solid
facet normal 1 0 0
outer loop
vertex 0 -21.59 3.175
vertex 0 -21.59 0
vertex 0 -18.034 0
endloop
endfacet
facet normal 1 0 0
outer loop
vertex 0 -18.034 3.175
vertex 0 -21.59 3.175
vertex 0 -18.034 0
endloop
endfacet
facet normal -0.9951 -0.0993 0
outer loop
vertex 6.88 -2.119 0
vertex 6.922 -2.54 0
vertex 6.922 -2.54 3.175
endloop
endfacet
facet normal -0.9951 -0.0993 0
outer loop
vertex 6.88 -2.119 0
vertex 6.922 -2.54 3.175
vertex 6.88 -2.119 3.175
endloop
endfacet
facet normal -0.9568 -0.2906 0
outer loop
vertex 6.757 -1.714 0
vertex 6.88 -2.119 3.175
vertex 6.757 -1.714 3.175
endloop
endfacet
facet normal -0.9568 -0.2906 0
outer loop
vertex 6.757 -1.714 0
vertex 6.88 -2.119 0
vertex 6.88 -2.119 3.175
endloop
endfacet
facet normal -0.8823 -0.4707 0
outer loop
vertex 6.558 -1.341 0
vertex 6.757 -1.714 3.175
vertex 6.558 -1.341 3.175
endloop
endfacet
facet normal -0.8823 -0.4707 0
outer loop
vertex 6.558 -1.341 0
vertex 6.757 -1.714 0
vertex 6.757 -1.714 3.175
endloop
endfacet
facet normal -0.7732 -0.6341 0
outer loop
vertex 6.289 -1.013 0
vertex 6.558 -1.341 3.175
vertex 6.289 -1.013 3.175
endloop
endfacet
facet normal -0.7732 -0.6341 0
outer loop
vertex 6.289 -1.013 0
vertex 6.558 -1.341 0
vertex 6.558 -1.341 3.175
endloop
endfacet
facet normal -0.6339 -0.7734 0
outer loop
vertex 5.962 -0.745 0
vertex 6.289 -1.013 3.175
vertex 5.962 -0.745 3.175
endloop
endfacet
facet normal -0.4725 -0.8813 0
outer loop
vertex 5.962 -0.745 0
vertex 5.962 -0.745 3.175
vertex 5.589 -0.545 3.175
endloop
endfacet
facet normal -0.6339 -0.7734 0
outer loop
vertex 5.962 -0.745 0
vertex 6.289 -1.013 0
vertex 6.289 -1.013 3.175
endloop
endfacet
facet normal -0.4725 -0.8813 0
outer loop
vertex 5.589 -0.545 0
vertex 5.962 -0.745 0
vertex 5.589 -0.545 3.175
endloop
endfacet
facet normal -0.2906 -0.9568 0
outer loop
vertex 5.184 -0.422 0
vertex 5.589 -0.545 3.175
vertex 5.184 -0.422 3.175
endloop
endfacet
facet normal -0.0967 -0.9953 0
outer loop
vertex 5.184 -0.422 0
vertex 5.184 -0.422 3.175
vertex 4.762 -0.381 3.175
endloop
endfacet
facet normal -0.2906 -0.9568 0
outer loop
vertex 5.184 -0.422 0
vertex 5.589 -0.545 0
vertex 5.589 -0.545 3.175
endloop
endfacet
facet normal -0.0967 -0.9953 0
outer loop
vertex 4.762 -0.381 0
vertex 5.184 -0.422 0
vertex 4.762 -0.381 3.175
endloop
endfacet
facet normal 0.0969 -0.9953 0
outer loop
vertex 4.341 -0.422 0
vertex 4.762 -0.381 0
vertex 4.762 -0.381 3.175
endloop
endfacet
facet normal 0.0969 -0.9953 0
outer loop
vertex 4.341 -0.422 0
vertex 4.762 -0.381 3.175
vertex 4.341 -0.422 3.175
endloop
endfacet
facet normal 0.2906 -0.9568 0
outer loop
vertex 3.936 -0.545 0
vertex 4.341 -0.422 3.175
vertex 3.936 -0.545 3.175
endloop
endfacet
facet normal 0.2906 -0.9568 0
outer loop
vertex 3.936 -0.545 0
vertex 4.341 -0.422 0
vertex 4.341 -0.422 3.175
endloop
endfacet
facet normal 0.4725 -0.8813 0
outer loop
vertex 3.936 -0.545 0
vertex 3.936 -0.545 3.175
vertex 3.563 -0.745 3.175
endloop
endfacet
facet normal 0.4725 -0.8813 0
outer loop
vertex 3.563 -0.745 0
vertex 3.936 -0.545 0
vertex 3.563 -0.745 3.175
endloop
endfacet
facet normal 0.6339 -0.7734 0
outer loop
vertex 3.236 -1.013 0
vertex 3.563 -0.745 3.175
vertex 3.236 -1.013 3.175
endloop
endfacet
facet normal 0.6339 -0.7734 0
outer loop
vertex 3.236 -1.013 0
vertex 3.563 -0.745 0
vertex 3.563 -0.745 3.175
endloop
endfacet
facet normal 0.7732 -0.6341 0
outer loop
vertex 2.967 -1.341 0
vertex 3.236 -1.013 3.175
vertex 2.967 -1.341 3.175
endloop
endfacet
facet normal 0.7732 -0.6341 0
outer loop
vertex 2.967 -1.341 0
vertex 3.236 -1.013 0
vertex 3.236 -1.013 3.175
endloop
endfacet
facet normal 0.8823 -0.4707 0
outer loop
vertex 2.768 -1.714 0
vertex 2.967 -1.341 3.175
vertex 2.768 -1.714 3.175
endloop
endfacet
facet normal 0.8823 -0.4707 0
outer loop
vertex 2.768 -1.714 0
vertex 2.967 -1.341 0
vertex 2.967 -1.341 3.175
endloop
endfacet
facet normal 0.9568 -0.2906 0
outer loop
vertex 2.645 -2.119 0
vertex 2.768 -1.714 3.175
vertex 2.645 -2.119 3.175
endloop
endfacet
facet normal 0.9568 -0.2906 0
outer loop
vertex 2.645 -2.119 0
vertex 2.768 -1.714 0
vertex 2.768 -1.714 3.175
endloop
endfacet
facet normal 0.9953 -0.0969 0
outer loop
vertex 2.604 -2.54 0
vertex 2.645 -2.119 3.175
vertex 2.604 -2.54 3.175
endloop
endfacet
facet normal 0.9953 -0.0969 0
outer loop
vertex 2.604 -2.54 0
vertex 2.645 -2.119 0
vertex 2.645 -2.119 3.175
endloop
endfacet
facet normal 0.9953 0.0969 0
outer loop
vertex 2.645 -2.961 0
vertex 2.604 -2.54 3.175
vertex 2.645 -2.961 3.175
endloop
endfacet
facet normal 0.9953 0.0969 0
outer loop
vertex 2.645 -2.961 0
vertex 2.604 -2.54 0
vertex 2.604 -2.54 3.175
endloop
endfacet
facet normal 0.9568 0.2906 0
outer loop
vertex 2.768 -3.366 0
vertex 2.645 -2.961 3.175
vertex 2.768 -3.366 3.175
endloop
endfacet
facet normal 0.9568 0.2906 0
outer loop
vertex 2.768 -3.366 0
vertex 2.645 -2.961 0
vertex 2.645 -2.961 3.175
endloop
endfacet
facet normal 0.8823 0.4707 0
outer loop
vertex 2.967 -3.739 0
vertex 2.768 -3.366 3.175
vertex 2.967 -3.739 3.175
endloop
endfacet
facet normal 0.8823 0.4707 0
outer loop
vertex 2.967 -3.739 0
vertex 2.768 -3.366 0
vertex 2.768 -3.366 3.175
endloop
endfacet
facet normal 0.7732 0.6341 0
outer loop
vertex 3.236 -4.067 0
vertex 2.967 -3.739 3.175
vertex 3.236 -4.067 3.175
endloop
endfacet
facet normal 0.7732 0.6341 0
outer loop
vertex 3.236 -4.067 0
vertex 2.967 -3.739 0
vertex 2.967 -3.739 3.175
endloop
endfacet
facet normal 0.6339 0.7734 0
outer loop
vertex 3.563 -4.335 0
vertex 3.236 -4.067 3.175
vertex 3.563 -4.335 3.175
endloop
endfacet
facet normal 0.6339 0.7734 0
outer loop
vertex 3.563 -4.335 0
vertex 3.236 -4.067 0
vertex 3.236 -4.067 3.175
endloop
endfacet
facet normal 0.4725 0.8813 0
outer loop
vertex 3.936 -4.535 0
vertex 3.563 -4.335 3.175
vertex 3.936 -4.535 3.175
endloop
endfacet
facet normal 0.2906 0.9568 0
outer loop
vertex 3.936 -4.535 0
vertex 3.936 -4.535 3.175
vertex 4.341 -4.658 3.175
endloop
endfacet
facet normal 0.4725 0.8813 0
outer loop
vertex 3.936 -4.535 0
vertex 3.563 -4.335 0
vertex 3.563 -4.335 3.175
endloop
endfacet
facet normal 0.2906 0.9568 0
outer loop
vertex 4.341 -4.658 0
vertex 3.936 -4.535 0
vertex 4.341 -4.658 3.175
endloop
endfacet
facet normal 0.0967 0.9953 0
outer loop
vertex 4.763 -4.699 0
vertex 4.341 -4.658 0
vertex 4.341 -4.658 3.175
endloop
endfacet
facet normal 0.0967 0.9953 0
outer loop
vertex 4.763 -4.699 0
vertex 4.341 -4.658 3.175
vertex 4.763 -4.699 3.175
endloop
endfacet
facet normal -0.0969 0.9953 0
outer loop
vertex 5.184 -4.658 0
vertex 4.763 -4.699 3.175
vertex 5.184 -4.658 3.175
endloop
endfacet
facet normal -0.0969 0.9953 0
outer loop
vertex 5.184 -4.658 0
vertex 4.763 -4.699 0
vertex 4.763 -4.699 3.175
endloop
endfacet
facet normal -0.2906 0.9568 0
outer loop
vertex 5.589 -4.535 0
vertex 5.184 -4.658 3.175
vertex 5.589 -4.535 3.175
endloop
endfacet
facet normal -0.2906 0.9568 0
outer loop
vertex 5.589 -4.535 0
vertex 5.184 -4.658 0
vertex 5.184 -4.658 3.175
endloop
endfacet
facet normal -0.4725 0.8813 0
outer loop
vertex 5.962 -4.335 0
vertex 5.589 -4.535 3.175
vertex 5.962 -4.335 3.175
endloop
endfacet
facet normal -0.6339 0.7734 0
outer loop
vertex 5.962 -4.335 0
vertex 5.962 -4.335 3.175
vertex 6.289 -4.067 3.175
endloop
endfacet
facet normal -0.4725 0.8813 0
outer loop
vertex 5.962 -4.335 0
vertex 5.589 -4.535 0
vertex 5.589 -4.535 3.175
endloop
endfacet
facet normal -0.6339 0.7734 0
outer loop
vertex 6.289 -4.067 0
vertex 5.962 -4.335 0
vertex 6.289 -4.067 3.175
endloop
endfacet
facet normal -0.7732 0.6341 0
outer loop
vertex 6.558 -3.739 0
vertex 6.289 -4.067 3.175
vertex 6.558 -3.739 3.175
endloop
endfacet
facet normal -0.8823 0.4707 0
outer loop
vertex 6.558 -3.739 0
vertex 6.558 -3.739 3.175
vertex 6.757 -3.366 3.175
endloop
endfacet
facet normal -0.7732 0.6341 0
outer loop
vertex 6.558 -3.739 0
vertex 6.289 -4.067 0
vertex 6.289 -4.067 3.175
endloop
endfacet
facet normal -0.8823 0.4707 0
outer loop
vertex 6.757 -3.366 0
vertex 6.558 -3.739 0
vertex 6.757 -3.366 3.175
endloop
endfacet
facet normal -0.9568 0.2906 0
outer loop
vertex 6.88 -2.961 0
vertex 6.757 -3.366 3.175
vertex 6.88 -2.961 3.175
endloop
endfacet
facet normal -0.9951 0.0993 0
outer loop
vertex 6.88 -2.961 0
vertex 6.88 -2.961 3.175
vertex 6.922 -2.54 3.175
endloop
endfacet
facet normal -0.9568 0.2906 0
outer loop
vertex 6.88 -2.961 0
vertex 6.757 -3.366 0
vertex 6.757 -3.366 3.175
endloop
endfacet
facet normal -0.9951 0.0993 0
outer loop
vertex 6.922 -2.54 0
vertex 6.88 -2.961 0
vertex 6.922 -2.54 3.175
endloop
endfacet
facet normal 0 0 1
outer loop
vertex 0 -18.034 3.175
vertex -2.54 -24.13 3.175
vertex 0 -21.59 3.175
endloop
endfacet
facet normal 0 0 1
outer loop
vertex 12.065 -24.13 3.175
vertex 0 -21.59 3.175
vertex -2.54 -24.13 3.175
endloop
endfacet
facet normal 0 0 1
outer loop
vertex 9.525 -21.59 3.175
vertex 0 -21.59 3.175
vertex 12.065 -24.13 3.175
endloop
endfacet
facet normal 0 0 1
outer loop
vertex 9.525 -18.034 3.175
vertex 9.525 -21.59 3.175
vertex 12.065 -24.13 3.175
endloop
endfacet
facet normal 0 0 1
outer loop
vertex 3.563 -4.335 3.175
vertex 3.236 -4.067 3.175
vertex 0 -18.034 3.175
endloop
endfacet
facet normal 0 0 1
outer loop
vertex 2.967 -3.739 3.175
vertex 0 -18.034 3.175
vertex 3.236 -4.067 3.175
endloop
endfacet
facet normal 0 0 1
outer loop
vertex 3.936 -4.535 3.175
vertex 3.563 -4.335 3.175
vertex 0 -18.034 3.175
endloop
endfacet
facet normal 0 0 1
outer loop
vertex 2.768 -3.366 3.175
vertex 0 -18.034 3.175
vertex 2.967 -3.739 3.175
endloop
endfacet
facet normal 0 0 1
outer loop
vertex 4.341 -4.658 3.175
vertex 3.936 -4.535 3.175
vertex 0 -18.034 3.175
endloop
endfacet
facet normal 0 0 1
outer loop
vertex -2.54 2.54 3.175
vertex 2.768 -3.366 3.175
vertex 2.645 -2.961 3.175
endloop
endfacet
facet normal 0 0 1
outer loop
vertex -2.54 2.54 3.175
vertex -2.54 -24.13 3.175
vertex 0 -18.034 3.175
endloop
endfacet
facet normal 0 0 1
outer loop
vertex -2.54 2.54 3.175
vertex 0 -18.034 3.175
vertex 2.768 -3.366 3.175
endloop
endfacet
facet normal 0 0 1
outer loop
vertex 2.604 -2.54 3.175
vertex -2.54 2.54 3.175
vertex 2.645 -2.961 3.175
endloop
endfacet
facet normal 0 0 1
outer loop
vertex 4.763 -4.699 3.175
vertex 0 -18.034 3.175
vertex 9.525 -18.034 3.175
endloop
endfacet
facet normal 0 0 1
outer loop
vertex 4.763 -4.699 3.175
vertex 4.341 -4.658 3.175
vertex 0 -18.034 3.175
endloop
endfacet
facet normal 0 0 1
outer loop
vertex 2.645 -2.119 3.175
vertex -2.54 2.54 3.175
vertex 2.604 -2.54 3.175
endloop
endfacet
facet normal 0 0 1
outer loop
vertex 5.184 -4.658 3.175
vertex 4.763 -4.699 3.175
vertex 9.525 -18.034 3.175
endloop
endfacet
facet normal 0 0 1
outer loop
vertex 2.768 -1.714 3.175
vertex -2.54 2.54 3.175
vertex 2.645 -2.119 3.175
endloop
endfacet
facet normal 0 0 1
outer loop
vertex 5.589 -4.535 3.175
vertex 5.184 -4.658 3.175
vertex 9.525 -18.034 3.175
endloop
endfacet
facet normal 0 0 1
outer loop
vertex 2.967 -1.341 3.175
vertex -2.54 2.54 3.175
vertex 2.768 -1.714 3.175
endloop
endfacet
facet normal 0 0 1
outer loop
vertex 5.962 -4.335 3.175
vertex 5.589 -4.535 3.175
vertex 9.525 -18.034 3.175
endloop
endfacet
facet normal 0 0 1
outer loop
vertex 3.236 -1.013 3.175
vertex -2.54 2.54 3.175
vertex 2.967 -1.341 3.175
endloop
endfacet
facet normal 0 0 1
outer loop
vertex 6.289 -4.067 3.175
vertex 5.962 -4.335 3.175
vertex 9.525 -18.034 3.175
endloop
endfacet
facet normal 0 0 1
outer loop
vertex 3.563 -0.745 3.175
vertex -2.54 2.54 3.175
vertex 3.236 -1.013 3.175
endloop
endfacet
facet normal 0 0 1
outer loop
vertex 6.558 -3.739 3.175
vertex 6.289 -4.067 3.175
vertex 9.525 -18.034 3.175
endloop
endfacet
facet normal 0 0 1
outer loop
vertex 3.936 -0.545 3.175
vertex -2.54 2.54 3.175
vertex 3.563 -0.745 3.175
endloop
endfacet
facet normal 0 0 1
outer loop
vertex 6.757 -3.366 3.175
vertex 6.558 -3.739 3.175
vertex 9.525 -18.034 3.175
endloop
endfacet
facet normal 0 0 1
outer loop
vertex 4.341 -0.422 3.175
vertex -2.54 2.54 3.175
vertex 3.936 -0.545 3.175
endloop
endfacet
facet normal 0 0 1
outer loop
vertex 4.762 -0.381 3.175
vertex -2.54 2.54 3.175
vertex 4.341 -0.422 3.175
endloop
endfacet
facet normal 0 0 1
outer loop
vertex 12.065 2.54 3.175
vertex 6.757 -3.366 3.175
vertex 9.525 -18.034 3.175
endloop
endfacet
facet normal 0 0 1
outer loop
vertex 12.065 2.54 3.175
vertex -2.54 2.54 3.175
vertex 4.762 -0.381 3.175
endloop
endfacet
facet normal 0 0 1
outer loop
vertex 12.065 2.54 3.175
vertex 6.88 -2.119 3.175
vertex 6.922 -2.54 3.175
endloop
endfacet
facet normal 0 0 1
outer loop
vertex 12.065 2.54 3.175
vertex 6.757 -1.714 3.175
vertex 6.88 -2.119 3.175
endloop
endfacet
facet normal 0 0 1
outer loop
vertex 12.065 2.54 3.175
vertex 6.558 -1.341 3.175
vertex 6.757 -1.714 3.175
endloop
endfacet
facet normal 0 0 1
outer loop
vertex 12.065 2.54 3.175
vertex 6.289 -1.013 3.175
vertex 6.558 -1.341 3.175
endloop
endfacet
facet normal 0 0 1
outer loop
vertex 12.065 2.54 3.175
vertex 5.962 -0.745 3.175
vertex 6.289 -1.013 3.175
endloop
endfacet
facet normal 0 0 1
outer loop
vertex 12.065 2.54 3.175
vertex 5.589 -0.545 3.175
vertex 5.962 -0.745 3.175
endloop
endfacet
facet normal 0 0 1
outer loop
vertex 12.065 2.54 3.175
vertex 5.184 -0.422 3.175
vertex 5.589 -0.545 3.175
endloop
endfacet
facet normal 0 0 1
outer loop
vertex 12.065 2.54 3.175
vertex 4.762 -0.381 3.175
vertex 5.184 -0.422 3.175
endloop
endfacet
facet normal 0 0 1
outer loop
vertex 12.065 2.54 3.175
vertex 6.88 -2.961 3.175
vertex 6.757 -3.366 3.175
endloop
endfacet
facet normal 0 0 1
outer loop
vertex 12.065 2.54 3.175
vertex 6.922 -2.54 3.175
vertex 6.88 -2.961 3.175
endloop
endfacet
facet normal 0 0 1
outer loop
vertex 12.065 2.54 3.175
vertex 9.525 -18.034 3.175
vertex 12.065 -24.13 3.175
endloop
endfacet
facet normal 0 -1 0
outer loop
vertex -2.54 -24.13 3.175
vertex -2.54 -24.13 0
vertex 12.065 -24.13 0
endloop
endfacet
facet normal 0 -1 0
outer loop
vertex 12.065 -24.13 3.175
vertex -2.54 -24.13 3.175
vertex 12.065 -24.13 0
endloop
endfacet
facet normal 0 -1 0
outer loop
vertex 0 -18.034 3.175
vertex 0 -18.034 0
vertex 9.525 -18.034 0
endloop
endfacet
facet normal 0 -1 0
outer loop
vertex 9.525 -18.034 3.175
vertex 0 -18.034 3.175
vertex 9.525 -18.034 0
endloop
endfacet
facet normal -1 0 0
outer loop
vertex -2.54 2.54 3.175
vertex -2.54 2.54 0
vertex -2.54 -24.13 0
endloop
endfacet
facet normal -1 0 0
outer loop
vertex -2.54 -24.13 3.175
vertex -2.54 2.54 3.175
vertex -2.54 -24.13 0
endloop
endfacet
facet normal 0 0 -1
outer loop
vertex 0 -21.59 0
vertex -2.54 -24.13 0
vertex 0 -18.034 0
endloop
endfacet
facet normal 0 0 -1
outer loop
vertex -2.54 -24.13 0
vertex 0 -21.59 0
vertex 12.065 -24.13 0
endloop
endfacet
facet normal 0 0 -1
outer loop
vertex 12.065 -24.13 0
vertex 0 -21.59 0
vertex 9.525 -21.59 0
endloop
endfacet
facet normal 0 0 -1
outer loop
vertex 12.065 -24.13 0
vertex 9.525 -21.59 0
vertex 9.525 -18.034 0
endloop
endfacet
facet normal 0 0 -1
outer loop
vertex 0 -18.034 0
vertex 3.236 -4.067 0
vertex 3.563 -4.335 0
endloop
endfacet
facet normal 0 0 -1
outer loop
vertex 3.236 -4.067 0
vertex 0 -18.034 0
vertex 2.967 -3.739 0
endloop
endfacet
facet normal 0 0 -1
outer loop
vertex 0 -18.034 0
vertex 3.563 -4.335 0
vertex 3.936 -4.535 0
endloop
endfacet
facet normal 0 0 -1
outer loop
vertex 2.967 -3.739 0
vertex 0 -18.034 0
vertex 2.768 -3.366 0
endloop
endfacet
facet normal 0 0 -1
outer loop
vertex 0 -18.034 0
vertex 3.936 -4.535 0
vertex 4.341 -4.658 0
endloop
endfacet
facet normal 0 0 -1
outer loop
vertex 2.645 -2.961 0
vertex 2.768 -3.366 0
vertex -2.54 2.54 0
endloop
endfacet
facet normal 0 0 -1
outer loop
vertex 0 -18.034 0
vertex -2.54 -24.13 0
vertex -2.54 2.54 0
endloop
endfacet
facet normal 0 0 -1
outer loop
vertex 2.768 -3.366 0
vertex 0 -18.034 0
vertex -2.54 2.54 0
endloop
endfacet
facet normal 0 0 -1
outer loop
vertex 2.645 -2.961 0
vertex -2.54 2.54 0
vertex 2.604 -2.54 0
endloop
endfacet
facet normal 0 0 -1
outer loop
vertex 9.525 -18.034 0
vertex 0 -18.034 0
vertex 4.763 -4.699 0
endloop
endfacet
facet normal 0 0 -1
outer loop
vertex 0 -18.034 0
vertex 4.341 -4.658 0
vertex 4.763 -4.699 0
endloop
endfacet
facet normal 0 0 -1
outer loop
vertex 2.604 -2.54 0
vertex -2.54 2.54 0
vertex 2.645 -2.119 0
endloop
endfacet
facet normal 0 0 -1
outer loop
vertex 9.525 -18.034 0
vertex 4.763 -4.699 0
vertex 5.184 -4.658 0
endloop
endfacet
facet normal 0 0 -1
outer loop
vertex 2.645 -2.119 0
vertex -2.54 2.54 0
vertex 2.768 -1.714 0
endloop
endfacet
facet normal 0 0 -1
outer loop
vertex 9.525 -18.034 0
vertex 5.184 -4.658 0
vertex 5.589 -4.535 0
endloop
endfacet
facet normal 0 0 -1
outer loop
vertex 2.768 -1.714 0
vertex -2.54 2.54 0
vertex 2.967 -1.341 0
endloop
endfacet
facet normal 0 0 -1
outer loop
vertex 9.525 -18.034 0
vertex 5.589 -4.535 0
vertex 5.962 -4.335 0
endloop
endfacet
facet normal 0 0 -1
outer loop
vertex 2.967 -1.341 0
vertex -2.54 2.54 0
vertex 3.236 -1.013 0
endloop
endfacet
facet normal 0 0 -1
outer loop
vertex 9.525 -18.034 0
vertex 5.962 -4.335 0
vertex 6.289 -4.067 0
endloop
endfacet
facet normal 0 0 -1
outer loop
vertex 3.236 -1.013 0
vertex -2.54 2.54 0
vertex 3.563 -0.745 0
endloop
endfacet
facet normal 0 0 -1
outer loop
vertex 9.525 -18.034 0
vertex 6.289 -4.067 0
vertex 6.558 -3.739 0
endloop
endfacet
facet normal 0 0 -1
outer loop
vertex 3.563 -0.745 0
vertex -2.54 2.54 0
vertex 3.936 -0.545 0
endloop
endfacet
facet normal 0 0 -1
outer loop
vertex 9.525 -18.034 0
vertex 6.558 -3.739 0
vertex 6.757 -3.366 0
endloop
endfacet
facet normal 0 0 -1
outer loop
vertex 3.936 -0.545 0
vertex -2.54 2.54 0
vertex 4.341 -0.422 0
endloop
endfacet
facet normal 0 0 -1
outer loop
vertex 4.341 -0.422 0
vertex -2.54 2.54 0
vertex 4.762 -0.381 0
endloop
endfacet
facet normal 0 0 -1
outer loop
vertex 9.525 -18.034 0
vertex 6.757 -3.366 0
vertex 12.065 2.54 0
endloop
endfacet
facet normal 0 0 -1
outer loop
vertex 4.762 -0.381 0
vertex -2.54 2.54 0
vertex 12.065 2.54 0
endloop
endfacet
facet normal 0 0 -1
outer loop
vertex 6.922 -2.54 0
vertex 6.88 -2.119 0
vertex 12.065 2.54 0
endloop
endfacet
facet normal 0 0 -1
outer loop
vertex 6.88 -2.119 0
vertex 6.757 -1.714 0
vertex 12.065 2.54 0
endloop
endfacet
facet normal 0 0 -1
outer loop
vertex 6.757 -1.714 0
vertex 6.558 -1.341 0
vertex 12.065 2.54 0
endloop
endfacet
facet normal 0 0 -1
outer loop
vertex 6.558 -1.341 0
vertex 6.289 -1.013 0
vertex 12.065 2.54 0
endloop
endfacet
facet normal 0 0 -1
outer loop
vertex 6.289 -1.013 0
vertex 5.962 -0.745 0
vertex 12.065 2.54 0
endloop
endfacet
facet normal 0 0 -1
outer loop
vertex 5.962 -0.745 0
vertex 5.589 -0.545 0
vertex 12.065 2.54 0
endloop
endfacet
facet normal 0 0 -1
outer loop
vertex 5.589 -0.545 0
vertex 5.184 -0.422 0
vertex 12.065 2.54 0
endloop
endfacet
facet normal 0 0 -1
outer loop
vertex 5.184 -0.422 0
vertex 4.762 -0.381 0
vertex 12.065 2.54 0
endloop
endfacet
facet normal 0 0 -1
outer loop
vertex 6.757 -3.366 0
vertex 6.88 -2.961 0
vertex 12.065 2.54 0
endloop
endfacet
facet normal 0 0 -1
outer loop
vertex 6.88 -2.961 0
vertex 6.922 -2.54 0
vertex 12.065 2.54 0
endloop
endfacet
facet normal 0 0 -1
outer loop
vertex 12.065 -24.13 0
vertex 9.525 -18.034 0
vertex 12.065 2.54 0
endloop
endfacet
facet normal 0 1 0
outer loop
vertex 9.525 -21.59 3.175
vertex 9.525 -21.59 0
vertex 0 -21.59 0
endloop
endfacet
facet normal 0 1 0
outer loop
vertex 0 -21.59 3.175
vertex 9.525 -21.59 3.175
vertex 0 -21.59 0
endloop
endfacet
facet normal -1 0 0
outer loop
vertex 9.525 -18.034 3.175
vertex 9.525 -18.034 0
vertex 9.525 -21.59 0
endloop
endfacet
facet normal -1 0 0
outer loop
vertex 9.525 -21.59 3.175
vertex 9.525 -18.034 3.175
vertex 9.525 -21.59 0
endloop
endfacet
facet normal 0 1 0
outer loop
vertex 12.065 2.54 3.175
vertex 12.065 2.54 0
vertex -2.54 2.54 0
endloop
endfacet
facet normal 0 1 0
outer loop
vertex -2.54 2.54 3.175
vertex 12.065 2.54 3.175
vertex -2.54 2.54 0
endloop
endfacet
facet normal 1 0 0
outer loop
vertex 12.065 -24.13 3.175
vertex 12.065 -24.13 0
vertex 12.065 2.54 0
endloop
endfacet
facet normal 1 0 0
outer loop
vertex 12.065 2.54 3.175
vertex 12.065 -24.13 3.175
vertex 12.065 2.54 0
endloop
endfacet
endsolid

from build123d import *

# Parameters (mm, degrees)
F0_W     = 9.525
F0_H     = 18.034
F0_R     = 2.159
F1_DEPTH = 3.175


with BuildPart() as f1:
    # F0 (on Top) → F1 (new body)
    with BuildSketch(Plane.XY):
        with Locations((4.7625, -9.017)):
            Rectangle(F0_W, F0_H)
        with Locations((4.7625, -2.54)):
            Circle(F0_R, mode=Mode.SUBTRACT)
        Polygon((0, -18.034), (0, 0), (-2.54, 0), (-2.54, -21.59), (0, -21.59), align=None)
        Polygon((12.065, 0), (9.525, 0), (9.525, -18.034), (9.525, -21.59), (12.065, -21.59), align=None)
        Polygon((-2.54, 0), (0, 0), (9.525, 0), (12.065, 0), (12.065, 2.54), (-2.54, 2.54), align=None)
        Polygon((9.525, -21.59), (0, -21.59), (-2.54, -21.59), (-2.54, -24.13), (12.065, -24.13), (12.065, -21.59), align=None)
    extrude(amount=F1_DEPTH)


solid = f1.part
